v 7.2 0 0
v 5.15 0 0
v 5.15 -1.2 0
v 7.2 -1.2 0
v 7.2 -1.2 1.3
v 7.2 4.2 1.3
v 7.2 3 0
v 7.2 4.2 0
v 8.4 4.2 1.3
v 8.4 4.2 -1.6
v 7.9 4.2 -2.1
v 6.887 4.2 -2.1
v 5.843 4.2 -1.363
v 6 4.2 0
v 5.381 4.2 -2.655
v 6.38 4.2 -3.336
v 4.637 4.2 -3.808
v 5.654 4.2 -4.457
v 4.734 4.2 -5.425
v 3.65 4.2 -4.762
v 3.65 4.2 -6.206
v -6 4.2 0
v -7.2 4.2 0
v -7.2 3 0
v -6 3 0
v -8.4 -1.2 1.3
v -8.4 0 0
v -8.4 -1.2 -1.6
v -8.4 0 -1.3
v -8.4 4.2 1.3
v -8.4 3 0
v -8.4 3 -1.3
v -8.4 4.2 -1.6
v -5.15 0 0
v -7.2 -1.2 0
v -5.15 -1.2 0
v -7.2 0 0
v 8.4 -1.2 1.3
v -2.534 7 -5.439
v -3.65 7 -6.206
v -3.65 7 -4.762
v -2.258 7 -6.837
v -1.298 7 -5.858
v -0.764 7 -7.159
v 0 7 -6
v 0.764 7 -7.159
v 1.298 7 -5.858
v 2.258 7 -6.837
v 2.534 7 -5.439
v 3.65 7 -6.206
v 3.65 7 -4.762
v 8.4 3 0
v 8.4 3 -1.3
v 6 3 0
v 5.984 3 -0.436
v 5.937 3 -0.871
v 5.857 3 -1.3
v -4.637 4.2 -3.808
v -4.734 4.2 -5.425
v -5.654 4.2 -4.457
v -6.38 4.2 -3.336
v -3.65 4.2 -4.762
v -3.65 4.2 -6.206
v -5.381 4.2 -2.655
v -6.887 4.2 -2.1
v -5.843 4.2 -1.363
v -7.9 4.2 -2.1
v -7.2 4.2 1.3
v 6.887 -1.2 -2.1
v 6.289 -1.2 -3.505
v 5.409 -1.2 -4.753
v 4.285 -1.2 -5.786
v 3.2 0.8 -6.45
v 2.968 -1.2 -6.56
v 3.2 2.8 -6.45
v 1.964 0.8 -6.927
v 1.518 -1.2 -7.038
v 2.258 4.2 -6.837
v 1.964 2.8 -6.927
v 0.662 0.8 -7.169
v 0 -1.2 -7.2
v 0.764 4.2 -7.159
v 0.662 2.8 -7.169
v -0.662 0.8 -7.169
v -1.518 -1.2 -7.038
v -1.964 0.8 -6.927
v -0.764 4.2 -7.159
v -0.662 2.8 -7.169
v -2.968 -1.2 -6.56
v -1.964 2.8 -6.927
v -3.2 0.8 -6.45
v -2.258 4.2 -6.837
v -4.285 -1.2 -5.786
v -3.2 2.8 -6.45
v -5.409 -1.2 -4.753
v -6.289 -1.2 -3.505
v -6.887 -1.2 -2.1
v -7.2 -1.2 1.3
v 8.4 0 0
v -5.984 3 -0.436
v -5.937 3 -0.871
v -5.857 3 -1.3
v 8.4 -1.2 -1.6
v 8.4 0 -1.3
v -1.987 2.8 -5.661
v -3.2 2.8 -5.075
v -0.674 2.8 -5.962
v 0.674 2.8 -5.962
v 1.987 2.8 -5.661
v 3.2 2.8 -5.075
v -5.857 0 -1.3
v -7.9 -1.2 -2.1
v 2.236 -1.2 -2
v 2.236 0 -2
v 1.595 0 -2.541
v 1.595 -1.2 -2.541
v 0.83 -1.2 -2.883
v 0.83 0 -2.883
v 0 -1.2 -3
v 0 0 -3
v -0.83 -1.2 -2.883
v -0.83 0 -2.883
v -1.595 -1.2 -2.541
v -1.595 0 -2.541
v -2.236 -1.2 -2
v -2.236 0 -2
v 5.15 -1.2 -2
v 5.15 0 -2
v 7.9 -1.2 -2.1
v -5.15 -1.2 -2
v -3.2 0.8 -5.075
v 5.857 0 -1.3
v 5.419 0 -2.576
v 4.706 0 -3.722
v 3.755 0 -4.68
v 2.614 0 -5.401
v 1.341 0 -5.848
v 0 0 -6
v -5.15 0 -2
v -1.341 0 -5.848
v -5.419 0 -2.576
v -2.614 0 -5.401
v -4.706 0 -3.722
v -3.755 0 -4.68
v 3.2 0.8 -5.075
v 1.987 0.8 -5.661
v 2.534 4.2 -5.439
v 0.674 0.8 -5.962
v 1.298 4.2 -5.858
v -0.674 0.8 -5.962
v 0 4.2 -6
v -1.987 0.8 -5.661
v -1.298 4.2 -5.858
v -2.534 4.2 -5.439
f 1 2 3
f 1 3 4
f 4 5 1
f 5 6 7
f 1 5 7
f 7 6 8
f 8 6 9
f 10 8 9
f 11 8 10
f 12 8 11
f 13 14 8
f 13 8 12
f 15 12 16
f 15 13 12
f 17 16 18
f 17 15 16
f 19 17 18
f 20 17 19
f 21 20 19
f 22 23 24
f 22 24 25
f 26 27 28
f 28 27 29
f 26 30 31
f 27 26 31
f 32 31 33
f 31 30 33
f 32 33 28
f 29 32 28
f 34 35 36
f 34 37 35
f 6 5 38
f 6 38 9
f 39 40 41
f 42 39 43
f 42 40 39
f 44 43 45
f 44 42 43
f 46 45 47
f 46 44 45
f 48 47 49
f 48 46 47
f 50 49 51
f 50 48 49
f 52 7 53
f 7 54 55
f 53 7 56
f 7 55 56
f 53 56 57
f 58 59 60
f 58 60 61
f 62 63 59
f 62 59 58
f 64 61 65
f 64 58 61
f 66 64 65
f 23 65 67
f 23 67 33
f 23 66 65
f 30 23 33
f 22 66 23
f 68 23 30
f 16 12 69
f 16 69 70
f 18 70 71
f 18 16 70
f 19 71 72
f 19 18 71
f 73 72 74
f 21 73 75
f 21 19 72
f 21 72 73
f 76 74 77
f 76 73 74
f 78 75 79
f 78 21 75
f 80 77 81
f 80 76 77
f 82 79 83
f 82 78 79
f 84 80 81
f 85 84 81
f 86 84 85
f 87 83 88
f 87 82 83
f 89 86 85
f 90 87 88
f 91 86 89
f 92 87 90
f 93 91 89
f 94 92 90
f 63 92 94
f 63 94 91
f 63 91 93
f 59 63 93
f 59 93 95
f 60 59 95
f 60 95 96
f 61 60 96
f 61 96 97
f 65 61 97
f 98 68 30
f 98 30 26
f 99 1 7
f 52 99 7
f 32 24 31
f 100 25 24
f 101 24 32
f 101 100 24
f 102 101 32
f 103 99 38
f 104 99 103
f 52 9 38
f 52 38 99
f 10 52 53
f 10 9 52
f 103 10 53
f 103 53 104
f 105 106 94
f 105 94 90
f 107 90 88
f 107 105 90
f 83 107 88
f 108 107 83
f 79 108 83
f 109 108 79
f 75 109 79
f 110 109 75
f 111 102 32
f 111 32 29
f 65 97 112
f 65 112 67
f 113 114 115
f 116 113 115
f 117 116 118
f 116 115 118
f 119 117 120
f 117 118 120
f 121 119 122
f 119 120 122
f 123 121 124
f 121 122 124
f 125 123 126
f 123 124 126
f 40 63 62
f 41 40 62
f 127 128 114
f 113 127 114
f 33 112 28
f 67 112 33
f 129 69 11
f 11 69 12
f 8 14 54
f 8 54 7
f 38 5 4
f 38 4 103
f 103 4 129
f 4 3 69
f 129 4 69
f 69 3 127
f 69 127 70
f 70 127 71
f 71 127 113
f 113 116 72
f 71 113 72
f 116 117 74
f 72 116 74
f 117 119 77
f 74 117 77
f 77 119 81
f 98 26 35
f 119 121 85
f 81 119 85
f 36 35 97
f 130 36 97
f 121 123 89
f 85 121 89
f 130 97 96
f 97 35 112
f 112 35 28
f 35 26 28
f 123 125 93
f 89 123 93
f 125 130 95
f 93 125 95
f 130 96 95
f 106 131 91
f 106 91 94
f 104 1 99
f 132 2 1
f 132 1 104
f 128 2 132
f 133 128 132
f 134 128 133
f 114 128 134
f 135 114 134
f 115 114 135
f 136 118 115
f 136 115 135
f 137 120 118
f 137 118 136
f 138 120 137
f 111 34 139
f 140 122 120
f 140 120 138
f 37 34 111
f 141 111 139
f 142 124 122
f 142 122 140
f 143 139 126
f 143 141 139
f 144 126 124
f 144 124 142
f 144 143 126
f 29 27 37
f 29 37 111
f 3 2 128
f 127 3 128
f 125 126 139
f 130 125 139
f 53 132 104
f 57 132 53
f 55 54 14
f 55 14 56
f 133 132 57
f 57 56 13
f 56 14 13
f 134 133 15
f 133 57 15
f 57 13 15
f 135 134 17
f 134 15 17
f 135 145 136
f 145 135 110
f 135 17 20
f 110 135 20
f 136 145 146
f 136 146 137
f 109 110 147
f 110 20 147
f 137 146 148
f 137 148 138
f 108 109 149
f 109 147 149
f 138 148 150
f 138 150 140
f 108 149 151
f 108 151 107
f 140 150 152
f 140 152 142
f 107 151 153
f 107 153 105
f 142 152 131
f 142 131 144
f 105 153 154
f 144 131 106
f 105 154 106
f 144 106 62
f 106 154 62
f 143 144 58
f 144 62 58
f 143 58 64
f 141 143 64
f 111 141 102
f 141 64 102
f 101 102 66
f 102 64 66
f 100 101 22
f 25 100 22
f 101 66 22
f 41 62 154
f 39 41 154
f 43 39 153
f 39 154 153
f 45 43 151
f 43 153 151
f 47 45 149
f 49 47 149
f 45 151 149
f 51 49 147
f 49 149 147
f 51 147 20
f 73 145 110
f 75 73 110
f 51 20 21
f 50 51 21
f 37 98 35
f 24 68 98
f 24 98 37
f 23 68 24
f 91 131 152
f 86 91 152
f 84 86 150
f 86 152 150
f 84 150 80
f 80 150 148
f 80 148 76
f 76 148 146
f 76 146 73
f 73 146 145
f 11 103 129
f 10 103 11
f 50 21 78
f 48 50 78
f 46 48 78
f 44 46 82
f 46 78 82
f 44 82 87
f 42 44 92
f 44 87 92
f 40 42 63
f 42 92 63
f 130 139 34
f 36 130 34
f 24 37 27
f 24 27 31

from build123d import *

# Parameters (mm, degrees)
SKETCH1_W                 = 6
SKETCH1_H                 = 1.2
SKETCH1_W_2               = 1.2
SKETCH1_H_2               = 4.2
REVOLVE1_ANGLE            = 180
REVOLVE2_START            = 4.2
REVOLVE2_DEPTH            = 2.8
SKETCH4_W                 = 6.4
SKETCH4_H                 = 2
CUT_EXTRUDE1_DEPTH        = 10
CUT_EXTRUDE2_DEPTH        = 10
BOSS_EXTRUDE6_DEPTH       = 1.2
SKETCH12_W                = 2
SKETCH12_H                = 2.1
BOSS_EXTRUDE15_DEPTH      = 5.4
SKETCH13_W                = 1.3
SKETCH13_H                = 3
CUT_EXTRUDE4_DEPTH        = 4
CUT_EXTRUDE5_DEPTH        = 4
CUT_EXTRUDE5_DEPTH_BACK   = 4
SKETCH14_W                = 1.3
SKETCH14_H                = 3
BOSS_EXTRUDE16_DEPTH      = 2.3
BOSS_EXTRUDE16_DEPTH_BACK = 0.1
SKETCH15_W                = 3.4
SKETCH15_H                = 5.4
SKETCH15_W_2              = 1.3
SKETCH15_H_2              = 3
SKETCH16_W                = 1.2
SKETCH16_H                = 1.3
CUT_EXTRUDE6_DEPTH        = 13.310970717
CHAMFER2_SIZE             = 0.5


# Read off the part's stored shape, not the designer's step: Revolve2
with BuildPart() as part:
    # Sketch1 → Revolve1 (revolve)
    with BuildSketch(Plane.XY):
        with Locations((3, -0.6)):
            Rectangle(SKETCH1_W, SKETCH1_H)
        with Locations((6.6, -0.6)):
            Rectangle(SKETCH1_W_2, SKETCH1_H)
        with Locations((6.6, 2.1)):
            Rectangle(SKETCH1_W_2, SKETCH1_H_2)
    revolve(axis=Axis((0, -1.2, 0), (0, 1, 0)), revolution_arc=REVOLVE1_ANGLE)

    # Revolve2 outline → Revolve2 (add)
    with BuildSketch(Plane(origin=(0, 0, 0), x_dir=(1, 0, 0), z_dir=(0, 1, 0)).offset(REVOLVE2_START)):
        with BuildLine():
            ThreePointArc((3.65, 6.206246853), (0, 7.2), (-3.65, 6.206246853))
            Line((-3.65, 6.206246853), (-3.65, 4.762089877))
            ThreePointArc((-3.65, 4.762089877), (0, 6), (3.65, 4.762089877))
            Line((3.65, 4.762089877), (3.65, 6.206246853))
        make_face()
    extrude(amount=REVOLVE2_DEPTH)

    # Sketch4 → Cut-Extrude1 (cut)
    with BuildSketch(Plane.XY):
        with Locations((0, 1.8)):
            Rectangle(SKETCH4_W, SKETCH4_H)
    extrude(amount=-CUT_EXTRUDE1_DEPTH, mode=Mode.SUBTRACT)

    # Sketch5 → Cut-Extrude2 (cut)
    with BuildSketch(Plane(origin=(0, 0, 0), x_dir=(1, 0, 0), z_dir=(0, 1, 0))):
        with BuildLine():
            Line((-5.15, 2), (-5.15, 0))
            Line((-5.15, 0), (-3, 0))
            ThreePointArc((-3, 0), (-2.802517077, 1.070466269), (-2.236067977, 2))
            Line((-2.236067977, 2), (-5.15, 2))
        make_face()
        with BuildLine():
            ThreePointArc((-2.236067977, 2), (-2.802517077, 1.070466269), (-3, 0))
            Line((-3, 0), (3, 0))
            ThreePointArc((3, 0), (2.802517077, 1.070466269), (2.236067977, 2))
            Line((2.236067977, 2), (-2.236067977, 2))
        make_face()
        with BuildLine():
            Line((-5.15, 0), (-5.15, -2))
            Line((-5.15, -2), (-2.236067977, -2))
            ThreePointArc((-2.236067977, -2), (-2.802517077, -1.070466269), (-3, 0))
            Line((-3, 0), (-5.15, 0))
        make_face()
        with BuildLine():
            ThreePointArc((-3, 0), (-2.802517077, -1.070466269), (-2.236067977, -2))
            Line((-2.236067977, -2), (2.236067977, -2))
            ThreePointArc((2.236067977, -2), (2.802517077, -1.070466269), (3, 0))
            Line((3, 0), (-3, 0))
        make_face()
        with BuildLine():
            ThreePointArc((2.236067977, 2), (0, 3), (-2.236067977, 2))
            Line((-2.236067977, 2), (2.236067977, 2))
        make_face()
        with BuildLine():
            ThreePointArc((2.236067977, 2), (2.802517077, 1.070466269), (3, 0))
            Line((3, 0), (5.15, 0))
            Line((5.15, 0), (5.15, 2))
            Line((5.15, 2), (2.236067977, 2))
        make_face()
        with BuildLine():
            ThreePointArc((3, 0), (2.802517077, -1.070466269), (2.236067977, -2))
            Line((2.236067977, -2), (5.15, -2))
            Line((5.15, -2), (5.15, 0))
            Line((5.15, 0), (3, 0))
        make_face()
    extrude(amount=-CUT_EXTRUDE2_DEPTH, mode=Mode.SUBTRACT)



with BuildPart() as body_2:
    # Sketch9 → Boss-Extrude6 (new body)
    with BuildSketch(Plane(origin=(-7.2, 0, 0), x_dir=(0, 0, -1), z_dir=(1, 0, 0))):
        Polygon((2.1, -1.2), (2.1, 4.2), (0, 4.2), (0, 3), (1.3, 3), (1.3, 0), (0, 0), (0, -1.2), align=None)
        Polygon((0, 3), (0, 4.2), (-1.3, 4.2), (-1.3, -1.2), (0, -1.2), (0, 0), align=None)
    extrude(amount=-BOSS_EXTRUDE6_DEPTH)


with BuildPart() as part_1:
    add(part.part)

    add(body_2.part)  # Boss-Extrude15 merges body 2
    # Sketch12 → Boss-Extrude15 (add)
    with BuildSketch(Plane(origin=(0, 4.2, 0), x_dir=(1, 0, 0), z_dir=(0, 1, 0))):
        with Locations((-7, 1.05)):
            Rectangle(SKETCH12_W, SKETCH12_H)
    extrude(amount=-BOSS_EXTRUDE15_DEPTH)

    # Sketch13 → Cut-Extrude4 (cut)
    with BuildSketch(Plane.ZY.offset(8.4)):
        with Locations((-0.65, 1.5)):
            Rectangle(SKETCH13_W, SKETCH13_H)
    extrude(amount=-CUT_EXTRUDE4_DEPTH, mode=Mode.SUBTRACT)

    # Sketch14 → Cut-Extrude5 (cut, two sides: drawn at the far end of the back side and taken through both)
    with BuildSketch(Plane(origin=(6.1, 0, 0), x_dir=(0, 0, -1), z_dir=(1, 0, 0)).offset(-CUT_EXTRUDE5_DEPTH_BACK)):
        with Locations((0.65, 1.5)):
            Rectangle(SKETCH14_W, SKETCH14_H)
    extrude(amount=CUT_EXTRUDE5_DEPTH + CUT_EXTRUDE5_DEPTH_BACK, mode=Mode.SUBTRACT)

    # Sketch15 → Boss-Extrude16 (add, two sides: drawn at the far end of the back side and taken through both)
    with BuildSketch(Plane(origin=(6.1, 0, 0), x_dir=(0, 0, -1), z_dir=(1, 0, 0)).offset(-BOSS_EXTRUDE16_DEPTH_BACK)):
        with Locations((0.4, 1.5)):
            Rectangle(SKETCH15_W, SKETCH15_H)
        with Locations((0.65, 1.5)):
            Rectangle(SKETCH15_W_2, SKETCH15_H_2, mode=Mode.SUBTRACT)
    extrude(amount=BOSS_EXTRUDE16_DEPTH + BOSS_EXTRUDE16_DEPTH_BACK)

    # Sketch16 → Cut-Extrude6 (cut, through all)
    with BuildSketch(Plane(origin=(0, 4.2, 0), x_dir=(1, 0, 0), z_dir=(0, 1, 0))):
        with Locations((6.6, -0.65)):
            Rectangle(SKETCH16_W, SKETCH16_H)
    extrude(amount=-CUT_EXTRUDE6_DEPTH, mode=Mode.SUBTRACT)

    # Chamfer2
    chamfer2_edges = [part_1.edges().sort_by_distance(p)[0] for p in [
        (-8.4, 1.5, -2.1),
        (8.4, 1.5, -2.1),
    ]]
    chamfer(chamfer2_edges, length=CHAMFER2_SIZE)


solid = part_1.part
